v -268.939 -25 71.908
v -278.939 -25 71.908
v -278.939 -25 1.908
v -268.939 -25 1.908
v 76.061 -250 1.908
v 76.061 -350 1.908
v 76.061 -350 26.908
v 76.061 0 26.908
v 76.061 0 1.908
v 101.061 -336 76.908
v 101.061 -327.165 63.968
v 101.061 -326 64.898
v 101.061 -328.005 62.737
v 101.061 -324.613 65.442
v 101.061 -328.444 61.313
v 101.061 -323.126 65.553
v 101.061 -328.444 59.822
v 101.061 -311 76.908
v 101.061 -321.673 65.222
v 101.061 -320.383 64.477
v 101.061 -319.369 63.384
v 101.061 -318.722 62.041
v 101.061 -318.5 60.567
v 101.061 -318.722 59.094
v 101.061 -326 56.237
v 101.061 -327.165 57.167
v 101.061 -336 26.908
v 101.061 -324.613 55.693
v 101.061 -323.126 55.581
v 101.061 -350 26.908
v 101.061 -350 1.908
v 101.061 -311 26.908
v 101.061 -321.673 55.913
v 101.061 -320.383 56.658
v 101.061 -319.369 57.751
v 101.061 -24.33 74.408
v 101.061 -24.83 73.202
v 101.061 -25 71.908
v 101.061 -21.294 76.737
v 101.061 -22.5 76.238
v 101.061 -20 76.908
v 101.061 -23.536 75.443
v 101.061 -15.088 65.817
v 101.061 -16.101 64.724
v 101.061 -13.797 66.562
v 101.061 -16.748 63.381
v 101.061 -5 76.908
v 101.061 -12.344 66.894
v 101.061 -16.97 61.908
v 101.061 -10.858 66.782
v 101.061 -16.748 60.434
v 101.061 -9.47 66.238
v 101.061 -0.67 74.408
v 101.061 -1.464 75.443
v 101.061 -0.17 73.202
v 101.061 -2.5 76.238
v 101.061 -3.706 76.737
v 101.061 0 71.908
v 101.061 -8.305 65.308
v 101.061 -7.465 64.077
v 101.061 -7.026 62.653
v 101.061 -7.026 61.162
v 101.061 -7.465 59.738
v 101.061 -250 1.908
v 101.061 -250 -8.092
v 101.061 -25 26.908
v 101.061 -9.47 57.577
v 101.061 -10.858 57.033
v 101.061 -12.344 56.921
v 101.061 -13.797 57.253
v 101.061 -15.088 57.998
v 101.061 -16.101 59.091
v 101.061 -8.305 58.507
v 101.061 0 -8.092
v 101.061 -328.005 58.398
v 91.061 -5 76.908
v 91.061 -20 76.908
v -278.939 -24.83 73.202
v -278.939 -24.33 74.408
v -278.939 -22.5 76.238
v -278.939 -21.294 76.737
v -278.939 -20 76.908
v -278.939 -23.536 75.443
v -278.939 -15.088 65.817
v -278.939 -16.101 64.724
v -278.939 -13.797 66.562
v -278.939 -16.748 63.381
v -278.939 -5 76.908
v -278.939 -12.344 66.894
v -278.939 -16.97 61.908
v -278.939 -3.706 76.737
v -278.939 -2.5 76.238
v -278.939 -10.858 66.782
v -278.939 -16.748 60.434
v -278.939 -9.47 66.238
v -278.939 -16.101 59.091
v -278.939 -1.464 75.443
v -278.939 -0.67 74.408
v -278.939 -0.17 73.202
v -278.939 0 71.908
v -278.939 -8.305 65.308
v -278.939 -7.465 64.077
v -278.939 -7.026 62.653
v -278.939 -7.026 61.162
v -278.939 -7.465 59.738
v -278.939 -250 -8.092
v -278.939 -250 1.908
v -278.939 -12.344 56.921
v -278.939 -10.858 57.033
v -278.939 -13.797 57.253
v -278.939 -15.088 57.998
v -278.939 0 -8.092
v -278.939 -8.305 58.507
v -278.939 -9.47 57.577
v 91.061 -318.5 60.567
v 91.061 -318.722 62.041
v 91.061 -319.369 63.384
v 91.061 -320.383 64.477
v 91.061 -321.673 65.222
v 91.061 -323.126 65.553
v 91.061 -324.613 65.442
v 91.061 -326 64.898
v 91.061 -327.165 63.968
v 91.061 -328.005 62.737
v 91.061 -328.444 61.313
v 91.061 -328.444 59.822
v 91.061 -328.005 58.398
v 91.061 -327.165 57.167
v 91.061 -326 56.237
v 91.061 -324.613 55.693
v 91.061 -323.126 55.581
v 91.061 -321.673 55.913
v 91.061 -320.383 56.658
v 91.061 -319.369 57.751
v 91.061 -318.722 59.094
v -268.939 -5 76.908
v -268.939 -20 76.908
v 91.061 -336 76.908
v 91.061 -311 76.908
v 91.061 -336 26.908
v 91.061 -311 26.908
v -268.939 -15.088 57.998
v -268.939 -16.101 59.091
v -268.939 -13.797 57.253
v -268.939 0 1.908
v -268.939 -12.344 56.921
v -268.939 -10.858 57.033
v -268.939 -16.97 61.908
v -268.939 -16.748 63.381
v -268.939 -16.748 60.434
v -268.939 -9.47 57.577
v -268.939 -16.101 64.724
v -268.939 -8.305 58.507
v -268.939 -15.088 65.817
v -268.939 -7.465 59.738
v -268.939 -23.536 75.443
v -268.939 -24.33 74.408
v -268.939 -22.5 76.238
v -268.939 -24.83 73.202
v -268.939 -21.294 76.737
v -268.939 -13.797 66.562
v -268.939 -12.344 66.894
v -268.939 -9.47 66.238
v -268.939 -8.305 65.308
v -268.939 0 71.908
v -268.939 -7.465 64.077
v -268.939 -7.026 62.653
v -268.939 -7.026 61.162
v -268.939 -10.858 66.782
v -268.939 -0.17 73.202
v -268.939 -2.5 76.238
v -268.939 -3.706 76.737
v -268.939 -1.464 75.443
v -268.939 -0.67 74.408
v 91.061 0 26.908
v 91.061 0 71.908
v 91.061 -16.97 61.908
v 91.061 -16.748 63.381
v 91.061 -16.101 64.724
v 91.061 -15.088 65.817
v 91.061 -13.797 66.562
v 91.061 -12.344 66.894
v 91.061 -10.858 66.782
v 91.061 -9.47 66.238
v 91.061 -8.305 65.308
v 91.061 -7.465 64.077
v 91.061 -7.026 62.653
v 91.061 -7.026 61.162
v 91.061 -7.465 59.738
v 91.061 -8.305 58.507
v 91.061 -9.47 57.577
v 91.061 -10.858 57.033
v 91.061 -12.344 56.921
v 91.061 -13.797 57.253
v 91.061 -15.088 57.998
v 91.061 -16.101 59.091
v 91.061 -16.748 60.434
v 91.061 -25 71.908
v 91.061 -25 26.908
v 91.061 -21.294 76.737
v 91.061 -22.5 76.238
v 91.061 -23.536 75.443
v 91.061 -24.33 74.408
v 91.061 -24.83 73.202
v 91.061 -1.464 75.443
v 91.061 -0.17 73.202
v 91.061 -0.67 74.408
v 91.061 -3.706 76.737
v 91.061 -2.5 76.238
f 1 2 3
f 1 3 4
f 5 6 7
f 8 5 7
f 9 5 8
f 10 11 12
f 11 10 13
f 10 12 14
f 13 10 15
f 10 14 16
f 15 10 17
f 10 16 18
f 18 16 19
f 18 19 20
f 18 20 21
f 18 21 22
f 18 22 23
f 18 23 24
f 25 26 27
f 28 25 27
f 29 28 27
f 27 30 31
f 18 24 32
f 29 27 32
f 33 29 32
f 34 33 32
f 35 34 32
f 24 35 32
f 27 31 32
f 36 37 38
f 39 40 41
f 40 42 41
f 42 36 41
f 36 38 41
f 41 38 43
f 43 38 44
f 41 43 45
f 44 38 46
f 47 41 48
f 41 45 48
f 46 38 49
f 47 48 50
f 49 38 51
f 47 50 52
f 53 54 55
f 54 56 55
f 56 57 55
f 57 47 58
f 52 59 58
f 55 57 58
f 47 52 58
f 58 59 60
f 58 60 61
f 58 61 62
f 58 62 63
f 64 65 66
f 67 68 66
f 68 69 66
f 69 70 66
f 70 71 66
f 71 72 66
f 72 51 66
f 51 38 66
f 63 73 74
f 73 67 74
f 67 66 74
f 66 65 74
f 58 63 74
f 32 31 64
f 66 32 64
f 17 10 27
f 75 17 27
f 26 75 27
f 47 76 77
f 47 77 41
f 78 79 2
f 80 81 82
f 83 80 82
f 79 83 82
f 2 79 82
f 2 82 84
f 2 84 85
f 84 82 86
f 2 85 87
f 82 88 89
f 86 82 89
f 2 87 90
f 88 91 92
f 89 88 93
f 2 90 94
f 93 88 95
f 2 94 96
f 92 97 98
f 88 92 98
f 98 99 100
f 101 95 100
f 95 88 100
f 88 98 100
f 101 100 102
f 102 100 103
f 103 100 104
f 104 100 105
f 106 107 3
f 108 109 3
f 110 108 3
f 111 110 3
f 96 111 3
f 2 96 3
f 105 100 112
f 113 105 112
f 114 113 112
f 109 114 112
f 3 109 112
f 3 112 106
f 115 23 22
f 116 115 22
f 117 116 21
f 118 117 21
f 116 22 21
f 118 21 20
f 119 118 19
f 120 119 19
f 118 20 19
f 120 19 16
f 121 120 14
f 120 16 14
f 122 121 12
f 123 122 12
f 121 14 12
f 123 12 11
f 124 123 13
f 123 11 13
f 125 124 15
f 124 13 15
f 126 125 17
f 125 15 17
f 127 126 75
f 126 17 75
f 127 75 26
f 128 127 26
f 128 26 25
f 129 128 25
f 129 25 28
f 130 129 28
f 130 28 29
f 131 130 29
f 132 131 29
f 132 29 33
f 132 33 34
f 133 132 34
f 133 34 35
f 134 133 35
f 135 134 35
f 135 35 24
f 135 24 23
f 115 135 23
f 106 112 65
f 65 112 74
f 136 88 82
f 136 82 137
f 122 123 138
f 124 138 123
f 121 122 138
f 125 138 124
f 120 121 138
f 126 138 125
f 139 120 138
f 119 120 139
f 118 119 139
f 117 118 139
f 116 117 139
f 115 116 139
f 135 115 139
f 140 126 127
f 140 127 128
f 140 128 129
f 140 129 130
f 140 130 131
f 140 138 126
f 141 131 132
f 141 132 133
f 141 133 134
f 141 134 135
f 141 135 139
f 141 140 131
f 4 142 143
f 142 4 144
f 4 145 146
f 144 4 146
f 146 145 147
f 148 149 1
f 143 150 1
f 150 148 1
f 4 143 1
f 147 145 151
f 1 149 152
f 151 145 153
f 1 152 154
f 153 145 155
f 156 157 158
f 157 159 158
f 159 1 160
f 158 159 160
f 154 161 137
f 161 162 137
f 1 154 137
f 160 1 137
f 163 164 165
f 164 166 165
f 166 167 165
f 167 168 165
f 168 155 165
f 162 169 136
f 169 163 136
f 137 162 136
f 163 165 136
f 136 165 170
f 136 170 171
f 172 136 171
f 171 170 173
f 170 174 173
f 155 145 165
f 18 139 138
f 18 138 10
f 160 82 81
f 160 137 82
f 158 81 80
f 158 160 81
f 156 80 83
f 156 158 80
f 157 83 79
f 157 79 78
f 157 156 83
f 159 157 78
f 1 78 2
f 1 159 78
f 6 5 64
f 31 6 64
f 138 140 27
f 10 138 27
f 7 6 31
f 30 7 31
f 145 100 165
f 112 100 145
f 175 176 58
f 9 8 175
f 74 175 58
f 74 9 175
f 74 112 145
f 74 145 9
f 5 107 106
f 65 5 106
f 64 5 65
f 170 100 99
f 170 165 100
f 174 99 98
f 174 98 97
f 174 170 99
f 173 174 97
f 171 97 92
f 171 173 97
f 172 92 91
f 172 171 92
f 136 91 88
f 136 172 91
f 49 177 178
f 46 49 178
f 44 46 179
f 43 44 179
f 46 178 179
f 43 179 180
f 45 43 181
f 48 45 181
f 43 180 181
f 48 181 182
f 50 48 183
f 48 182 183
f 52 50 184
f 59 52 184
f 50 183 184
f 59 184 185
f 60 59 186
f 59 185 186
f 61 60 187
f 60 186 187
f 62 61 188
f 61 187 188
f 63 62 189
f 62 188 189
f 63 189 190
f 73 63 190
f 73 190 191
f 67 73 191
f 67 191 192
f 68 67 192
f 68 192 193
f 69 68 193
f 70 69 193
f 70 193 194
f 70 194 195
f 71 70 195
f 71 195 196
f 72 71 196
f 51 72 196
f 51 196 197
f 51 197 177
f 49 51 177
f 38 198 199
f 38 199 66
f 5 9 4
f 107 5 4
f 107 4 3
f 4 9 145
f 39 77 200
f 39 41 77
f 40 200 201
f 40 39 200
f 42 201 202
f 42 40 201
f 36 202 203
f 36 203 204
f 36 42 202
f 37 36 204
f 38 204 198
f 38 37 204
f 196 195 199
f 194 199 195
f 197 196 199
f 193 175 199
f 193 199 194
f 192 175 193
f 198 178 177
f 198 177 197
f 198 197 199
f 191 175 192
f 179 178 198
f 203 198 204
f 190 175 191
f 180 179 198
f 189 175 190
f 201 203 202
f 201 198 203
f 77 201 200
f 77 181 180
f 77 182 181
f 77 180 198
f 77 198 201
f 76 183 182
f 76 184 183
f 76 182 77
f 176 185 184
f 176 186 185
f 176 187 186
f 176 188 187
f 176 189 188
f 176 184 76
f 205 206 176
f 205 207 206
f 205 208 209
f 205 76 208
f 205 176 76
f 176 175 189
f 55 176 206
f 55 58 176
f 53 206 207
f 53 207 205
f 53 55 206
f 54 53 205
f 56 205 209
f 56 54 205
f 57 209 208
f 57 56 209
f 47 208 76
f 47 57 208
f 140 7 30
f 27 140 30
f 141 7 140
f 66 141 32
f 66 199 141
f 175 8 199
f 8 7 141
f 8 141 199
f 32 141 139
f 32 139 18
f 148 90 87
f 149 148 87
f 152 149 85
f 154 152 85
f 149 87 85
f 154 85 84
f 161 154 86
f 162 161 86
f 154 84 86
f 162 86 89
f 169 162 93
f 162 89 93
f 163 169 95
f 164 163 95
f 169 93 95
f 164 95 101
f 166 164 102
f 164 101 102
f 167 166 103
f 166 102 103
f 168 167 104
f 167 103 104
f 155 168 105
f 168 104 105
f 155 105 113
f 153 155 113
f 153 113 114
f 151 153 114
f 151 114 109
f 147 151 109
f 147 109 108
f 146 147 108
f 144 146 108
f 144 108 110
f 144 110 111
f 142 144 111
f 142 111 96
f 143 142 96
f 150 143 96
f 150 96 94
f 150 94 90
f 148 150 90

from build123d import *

# Parameters (mm, degrees)
F1_DEPTH  = 250
F0_W      = 10
F0_H      = 75
F2_DEPTH  = 25
F3_R      = 5
F4_DEPTH  = 380.001
F5_R      = 5
F6_W      = 25
F6_H      = 350
F7_DEPTH  = 25
F8_W      = 10
F8_H      = 25
F9_DEPTH  = 50
F10_R     = 5
F11_DEPTH = 380.001


with BuildPart() as f1:
    # F0 (on Front) → F1 (new body)
    with BuildSketch(Plane.XZ):
        Polygon((-268.93918, 1.907515), (-278.93918, 1.907515), (-278.93918, -8.092485), (101.06082, -8.092485), (101.06082, 1.907515), (91.06082, 1.907515), align=None)
    extrude(amount=F1_DEPTH)

    # F0 (on Front) → F2 (join)
    with BuildSketch(Plane.XZ):
        with Locations((-273.93918, 39.407515)):
            Rectangle(F0_W, F0_H)
        Polygon((-268.93918, 1.907515), (-278.93918, 1.907515), (-278.93918, -8.092485), (101.06082, -8.092485), (101.06082, 1.907515), (91.06082, 1.907515), align=None)
        with Locations((96.06082, 39.407515)):
            Rectangle(F0_W, F0_H)
    extrude(amount=F2_DEPTH)

    # F3 (on face) → F4 (cut, through all)
    with BuildSketch(Plane(origin=(-278.93918, 0, 0), x_dir=(0, -1, 0), z_dir=(-1, 0, 0))):
        with Locations((11.970147, 61.907515)):
            Circle(F3_R)
    extrude(amount=-F4_DEPTH, mode=Mode.SUBTRACT)

    # F5
    f5_edges = [f1.edges().sort_by_distance(p)[0] for p in [
        (-273.93918, 0, 76.907515),
        (-273.93918, -25, 76.907515),
        (96.06082, 0, 76.907515),
        (96.06082, -25, 76.907515),
    ]]
    fillet(f5_edges, radius=F5_R)

    # F6 (on face) → F7 (join)
    with BuildSketch(Plane.XY.offset(1.907515)):
        with Locations((88.56082, -175)):
            Rectangle(F6_W, F6_H)
    extrude(amount=F7_DEPTH)

    # F8 (on face) → F9 (join)
    with BuildSketch(Plane.XY.offset(26.907515)):
        with Locations((96.06082, -323.5)):
            Rectangle(F8_W, F8_H)
    extrude(amount=F9_DEPTH)

    # F10 (on face) → F11 (cut, through all)
    with BuildSketch(Plane.YZ.offset(101.06082)):
        with Locations((-323.5, 60.567401)):
            Circle(F10_R)
    extrude(amount=-F11_DEPTH, mode=Mode.SUBTRACT)


solid = f1.part
